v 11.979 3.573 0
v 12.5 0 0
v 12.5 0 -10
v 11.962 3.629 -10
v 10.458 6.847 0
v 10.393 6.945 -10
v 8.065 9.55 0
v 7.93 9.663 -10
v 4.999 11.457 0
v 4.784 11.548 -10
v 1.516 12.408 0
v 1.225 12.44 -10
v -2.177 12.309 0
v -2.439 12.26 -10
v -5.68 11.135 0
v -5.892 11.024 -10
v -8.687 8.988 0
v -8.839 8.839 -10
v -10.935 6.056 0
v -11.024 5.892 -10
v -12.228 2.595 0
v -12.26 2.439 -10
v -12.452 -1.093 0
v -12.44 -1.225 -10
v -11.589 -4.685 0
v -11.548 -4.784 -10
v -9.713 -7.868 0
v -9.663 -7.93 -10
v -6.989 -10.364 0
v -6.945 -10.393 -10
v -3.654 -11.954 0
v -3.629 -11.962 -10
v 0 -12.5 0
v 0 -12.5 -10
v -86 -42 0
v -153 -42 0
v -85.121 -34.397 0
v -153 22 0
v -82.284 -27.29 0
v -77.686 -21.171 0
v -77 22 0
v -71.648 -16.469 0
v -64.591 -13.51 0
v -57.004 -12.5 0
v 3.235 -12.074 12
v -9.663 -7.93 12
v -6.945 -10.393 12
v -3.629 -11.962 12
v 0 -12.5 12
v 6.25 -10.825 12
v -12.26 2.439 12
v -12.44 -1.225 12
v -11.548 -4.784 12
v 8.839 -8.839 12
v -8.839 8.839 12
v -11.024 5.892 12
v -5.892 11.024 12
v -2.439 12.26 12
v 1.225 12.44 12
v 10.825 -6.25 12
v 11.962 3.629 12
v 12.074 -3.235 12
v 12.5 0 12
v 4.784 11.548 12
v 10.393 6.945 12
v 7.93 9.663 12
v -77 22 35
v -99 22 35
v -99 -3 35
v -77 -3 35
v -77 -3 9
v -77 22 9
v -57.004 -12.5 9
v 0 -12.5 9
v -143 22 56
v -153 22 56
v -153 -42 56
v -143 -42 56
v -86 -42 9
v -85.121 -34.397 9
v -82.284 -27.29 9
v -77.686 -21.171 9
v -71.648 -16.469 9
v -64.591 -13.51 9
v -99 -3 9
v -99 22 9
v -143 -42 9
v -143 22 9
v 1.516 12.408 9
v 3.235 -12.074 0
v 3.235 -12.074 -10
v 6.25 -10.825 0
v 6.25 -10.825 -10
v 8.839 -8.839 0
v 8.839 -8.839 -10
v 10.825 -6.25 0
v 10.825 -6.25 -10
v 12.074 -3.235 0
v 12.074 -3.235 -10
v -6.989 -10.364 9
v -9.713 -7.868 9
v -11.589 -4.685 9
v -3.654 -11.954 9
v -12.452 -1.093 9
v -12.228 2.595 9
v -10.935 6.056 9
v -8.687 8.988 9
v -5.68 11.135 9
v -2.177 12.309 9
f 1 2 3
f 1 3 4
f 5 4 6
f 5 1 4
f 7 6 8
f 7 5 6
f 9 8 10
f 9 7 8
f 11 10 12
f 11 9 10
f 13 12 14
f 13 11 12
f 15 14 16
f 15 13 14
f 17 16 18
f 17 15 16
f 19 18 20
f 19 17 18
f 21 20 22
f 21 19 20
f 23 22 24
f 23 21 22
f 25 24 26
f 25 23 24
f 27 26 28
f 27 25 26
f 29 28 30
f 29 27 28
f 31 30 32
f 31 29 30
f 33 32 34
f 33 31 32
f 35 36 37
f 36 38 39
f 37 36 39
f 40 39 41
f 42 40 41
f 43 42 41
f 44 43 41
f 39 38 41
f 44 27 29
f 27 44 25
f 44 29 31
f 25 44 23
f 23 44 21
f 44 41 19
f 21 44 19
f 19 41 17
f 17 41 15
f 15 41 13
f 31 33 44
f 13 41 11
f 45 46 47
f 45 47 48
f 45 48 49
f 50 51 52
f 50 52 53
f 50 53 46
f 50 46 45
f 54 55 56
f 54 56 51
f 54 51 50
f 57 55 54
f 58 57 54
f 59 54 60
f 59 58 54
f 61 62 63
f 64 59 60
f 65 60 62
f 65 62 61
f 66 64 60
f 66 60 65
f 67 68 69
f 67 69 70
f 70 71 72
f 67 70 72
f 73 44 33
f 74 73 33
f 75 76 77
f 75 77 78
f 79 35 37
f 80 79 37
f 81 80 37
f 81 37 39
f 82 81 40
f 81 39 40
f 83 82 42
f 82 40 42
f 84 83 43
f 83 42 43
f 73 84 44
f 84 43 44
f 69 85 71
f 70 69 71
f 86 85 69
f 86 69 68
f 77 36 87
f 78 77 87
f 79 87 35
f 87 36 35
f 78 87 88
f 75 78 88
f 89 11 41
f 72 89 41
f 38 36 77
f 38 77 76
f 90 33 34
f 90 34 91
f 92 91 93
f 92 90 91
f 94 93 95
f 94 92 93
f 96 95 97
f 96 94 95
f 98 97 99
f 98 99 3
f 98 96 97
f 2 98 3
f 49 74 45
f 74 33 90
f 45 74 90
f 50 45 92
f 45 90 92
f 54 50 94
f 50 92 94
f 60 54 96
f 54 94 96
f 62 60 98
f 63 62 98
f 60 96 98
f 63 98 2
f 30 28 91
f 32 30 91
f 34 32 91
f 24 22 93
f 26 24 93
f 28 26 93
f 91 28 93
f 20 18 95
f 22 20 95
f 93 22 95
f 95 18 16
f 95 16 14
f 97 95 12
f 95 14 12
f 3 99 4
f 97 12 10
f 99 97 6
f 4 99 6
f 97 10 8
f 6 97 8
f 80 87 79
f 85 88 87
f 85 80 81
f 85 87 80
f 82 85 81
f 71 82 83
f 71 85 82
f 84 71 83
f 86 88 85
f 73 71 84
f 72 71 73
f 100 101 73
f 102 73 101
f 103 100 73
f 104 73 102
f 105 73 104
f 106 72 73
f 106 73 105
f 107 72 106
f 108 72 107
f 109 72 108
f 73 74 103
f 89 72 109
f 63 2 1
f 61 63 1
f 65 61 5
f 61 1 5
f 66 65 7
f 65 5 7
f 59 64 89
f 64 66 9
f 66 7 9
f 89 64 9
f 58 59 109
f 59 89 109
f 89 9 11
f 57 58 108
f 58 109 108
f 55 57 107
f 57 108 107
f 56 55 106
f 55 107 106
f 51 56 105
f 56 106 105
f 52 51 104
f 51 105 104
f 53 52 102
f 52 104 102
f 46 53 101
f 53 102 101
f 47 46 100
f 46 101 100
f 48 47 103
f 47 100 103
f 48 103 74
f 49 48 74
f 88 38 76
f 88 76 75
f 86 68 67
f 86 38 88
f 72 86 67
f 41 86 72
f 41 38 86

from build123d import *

# Parameters (mm, degrees)
F1_DEPTH      = 9
F0_W          = 10
F0_H          = 64
F2_DEPTH      = 56
F0_W_2        = 22
F0_H_2        = 25
F3_DEPTH      = 35
F4_DEPTH      = 12
F4_DEPTH_BACK = 10
F5_W          = 14
F5_H          = 25
F6_DEPTH      = 16


with BuildPart() as f1:
    # F0 (on Top) → F1 (new body)
    with BuildSketch(Plane.XY):
        with BuildLine():
            Line((-143, 22), (-143, -42))
            Line((-143, -42), (-86, -42))
            ThreePointArc((-86, -42), (-77.6864285452, -21.1714486497), (-57.0043106652, -12.5))
            Line((-57.0043106652, -12.5), (0, -12.5))
            ThreePointArc((0, -12.5), (-12.4769155686, 0.7593272639), (1.5158499456, 12.407747537))
            Line((1.5158499456, 12.407747537), (-77, 22))
            Line((-77, 22), (-77, -3))
            Line((-77, -3), (-99, -3))
            Line((-99, -3), (-99, 22))
            Line((-99, 22), (-143, 22))
        make_face()
    extrude(amount=F1_DEPTH)

    # F0 (on Top) → F2 (join)
    with BuildSketch(Plane.XY):
        with Locations((-148, -10)):
            Rectangle(F0_W, F0_H)
    extrude(amount=F2_DEPTH)

    # F0 (on Top) → F3 (join)
    with BuildSketch(Plane.XY):
        with Locations((-88, 9.5)):
            Rectangle(F0_W_2, F0_H_2)
    extrude(amount=F3_DEPTH)

    # F0 (on Top) → F4 (join, two sides)
    with BuildSketch(Plane.XY) as f4_sk:
        with BuildLine():
            ThreePointArc((1.5158499456, 12.407747537), (-12.4769155686, 0.7593272639), (0, -12.5))
            ThreePointArc((0, -12.5), (8.8388347648, -8.8388347648), (12.5, 0))
            ThreePointArc((12.5, 0), (9.3594370643, 8.2855861494), (1.5158499456, 12.407747537))
        make_face()
    extrude(amount=F4_DEPTH)
    extrude(f4_sk.sketch, amount=-F4_DEPTH_BACK)

    # F5 (on face) → F6 (join)
    with BuildSketch(Plane.XY.offset(35)):
        with Locations((-84, 9.5)):
            Rectangle(F5_W, F5_H)
    extrude(amount=-F6_DEPTH)


solid = f1.part
